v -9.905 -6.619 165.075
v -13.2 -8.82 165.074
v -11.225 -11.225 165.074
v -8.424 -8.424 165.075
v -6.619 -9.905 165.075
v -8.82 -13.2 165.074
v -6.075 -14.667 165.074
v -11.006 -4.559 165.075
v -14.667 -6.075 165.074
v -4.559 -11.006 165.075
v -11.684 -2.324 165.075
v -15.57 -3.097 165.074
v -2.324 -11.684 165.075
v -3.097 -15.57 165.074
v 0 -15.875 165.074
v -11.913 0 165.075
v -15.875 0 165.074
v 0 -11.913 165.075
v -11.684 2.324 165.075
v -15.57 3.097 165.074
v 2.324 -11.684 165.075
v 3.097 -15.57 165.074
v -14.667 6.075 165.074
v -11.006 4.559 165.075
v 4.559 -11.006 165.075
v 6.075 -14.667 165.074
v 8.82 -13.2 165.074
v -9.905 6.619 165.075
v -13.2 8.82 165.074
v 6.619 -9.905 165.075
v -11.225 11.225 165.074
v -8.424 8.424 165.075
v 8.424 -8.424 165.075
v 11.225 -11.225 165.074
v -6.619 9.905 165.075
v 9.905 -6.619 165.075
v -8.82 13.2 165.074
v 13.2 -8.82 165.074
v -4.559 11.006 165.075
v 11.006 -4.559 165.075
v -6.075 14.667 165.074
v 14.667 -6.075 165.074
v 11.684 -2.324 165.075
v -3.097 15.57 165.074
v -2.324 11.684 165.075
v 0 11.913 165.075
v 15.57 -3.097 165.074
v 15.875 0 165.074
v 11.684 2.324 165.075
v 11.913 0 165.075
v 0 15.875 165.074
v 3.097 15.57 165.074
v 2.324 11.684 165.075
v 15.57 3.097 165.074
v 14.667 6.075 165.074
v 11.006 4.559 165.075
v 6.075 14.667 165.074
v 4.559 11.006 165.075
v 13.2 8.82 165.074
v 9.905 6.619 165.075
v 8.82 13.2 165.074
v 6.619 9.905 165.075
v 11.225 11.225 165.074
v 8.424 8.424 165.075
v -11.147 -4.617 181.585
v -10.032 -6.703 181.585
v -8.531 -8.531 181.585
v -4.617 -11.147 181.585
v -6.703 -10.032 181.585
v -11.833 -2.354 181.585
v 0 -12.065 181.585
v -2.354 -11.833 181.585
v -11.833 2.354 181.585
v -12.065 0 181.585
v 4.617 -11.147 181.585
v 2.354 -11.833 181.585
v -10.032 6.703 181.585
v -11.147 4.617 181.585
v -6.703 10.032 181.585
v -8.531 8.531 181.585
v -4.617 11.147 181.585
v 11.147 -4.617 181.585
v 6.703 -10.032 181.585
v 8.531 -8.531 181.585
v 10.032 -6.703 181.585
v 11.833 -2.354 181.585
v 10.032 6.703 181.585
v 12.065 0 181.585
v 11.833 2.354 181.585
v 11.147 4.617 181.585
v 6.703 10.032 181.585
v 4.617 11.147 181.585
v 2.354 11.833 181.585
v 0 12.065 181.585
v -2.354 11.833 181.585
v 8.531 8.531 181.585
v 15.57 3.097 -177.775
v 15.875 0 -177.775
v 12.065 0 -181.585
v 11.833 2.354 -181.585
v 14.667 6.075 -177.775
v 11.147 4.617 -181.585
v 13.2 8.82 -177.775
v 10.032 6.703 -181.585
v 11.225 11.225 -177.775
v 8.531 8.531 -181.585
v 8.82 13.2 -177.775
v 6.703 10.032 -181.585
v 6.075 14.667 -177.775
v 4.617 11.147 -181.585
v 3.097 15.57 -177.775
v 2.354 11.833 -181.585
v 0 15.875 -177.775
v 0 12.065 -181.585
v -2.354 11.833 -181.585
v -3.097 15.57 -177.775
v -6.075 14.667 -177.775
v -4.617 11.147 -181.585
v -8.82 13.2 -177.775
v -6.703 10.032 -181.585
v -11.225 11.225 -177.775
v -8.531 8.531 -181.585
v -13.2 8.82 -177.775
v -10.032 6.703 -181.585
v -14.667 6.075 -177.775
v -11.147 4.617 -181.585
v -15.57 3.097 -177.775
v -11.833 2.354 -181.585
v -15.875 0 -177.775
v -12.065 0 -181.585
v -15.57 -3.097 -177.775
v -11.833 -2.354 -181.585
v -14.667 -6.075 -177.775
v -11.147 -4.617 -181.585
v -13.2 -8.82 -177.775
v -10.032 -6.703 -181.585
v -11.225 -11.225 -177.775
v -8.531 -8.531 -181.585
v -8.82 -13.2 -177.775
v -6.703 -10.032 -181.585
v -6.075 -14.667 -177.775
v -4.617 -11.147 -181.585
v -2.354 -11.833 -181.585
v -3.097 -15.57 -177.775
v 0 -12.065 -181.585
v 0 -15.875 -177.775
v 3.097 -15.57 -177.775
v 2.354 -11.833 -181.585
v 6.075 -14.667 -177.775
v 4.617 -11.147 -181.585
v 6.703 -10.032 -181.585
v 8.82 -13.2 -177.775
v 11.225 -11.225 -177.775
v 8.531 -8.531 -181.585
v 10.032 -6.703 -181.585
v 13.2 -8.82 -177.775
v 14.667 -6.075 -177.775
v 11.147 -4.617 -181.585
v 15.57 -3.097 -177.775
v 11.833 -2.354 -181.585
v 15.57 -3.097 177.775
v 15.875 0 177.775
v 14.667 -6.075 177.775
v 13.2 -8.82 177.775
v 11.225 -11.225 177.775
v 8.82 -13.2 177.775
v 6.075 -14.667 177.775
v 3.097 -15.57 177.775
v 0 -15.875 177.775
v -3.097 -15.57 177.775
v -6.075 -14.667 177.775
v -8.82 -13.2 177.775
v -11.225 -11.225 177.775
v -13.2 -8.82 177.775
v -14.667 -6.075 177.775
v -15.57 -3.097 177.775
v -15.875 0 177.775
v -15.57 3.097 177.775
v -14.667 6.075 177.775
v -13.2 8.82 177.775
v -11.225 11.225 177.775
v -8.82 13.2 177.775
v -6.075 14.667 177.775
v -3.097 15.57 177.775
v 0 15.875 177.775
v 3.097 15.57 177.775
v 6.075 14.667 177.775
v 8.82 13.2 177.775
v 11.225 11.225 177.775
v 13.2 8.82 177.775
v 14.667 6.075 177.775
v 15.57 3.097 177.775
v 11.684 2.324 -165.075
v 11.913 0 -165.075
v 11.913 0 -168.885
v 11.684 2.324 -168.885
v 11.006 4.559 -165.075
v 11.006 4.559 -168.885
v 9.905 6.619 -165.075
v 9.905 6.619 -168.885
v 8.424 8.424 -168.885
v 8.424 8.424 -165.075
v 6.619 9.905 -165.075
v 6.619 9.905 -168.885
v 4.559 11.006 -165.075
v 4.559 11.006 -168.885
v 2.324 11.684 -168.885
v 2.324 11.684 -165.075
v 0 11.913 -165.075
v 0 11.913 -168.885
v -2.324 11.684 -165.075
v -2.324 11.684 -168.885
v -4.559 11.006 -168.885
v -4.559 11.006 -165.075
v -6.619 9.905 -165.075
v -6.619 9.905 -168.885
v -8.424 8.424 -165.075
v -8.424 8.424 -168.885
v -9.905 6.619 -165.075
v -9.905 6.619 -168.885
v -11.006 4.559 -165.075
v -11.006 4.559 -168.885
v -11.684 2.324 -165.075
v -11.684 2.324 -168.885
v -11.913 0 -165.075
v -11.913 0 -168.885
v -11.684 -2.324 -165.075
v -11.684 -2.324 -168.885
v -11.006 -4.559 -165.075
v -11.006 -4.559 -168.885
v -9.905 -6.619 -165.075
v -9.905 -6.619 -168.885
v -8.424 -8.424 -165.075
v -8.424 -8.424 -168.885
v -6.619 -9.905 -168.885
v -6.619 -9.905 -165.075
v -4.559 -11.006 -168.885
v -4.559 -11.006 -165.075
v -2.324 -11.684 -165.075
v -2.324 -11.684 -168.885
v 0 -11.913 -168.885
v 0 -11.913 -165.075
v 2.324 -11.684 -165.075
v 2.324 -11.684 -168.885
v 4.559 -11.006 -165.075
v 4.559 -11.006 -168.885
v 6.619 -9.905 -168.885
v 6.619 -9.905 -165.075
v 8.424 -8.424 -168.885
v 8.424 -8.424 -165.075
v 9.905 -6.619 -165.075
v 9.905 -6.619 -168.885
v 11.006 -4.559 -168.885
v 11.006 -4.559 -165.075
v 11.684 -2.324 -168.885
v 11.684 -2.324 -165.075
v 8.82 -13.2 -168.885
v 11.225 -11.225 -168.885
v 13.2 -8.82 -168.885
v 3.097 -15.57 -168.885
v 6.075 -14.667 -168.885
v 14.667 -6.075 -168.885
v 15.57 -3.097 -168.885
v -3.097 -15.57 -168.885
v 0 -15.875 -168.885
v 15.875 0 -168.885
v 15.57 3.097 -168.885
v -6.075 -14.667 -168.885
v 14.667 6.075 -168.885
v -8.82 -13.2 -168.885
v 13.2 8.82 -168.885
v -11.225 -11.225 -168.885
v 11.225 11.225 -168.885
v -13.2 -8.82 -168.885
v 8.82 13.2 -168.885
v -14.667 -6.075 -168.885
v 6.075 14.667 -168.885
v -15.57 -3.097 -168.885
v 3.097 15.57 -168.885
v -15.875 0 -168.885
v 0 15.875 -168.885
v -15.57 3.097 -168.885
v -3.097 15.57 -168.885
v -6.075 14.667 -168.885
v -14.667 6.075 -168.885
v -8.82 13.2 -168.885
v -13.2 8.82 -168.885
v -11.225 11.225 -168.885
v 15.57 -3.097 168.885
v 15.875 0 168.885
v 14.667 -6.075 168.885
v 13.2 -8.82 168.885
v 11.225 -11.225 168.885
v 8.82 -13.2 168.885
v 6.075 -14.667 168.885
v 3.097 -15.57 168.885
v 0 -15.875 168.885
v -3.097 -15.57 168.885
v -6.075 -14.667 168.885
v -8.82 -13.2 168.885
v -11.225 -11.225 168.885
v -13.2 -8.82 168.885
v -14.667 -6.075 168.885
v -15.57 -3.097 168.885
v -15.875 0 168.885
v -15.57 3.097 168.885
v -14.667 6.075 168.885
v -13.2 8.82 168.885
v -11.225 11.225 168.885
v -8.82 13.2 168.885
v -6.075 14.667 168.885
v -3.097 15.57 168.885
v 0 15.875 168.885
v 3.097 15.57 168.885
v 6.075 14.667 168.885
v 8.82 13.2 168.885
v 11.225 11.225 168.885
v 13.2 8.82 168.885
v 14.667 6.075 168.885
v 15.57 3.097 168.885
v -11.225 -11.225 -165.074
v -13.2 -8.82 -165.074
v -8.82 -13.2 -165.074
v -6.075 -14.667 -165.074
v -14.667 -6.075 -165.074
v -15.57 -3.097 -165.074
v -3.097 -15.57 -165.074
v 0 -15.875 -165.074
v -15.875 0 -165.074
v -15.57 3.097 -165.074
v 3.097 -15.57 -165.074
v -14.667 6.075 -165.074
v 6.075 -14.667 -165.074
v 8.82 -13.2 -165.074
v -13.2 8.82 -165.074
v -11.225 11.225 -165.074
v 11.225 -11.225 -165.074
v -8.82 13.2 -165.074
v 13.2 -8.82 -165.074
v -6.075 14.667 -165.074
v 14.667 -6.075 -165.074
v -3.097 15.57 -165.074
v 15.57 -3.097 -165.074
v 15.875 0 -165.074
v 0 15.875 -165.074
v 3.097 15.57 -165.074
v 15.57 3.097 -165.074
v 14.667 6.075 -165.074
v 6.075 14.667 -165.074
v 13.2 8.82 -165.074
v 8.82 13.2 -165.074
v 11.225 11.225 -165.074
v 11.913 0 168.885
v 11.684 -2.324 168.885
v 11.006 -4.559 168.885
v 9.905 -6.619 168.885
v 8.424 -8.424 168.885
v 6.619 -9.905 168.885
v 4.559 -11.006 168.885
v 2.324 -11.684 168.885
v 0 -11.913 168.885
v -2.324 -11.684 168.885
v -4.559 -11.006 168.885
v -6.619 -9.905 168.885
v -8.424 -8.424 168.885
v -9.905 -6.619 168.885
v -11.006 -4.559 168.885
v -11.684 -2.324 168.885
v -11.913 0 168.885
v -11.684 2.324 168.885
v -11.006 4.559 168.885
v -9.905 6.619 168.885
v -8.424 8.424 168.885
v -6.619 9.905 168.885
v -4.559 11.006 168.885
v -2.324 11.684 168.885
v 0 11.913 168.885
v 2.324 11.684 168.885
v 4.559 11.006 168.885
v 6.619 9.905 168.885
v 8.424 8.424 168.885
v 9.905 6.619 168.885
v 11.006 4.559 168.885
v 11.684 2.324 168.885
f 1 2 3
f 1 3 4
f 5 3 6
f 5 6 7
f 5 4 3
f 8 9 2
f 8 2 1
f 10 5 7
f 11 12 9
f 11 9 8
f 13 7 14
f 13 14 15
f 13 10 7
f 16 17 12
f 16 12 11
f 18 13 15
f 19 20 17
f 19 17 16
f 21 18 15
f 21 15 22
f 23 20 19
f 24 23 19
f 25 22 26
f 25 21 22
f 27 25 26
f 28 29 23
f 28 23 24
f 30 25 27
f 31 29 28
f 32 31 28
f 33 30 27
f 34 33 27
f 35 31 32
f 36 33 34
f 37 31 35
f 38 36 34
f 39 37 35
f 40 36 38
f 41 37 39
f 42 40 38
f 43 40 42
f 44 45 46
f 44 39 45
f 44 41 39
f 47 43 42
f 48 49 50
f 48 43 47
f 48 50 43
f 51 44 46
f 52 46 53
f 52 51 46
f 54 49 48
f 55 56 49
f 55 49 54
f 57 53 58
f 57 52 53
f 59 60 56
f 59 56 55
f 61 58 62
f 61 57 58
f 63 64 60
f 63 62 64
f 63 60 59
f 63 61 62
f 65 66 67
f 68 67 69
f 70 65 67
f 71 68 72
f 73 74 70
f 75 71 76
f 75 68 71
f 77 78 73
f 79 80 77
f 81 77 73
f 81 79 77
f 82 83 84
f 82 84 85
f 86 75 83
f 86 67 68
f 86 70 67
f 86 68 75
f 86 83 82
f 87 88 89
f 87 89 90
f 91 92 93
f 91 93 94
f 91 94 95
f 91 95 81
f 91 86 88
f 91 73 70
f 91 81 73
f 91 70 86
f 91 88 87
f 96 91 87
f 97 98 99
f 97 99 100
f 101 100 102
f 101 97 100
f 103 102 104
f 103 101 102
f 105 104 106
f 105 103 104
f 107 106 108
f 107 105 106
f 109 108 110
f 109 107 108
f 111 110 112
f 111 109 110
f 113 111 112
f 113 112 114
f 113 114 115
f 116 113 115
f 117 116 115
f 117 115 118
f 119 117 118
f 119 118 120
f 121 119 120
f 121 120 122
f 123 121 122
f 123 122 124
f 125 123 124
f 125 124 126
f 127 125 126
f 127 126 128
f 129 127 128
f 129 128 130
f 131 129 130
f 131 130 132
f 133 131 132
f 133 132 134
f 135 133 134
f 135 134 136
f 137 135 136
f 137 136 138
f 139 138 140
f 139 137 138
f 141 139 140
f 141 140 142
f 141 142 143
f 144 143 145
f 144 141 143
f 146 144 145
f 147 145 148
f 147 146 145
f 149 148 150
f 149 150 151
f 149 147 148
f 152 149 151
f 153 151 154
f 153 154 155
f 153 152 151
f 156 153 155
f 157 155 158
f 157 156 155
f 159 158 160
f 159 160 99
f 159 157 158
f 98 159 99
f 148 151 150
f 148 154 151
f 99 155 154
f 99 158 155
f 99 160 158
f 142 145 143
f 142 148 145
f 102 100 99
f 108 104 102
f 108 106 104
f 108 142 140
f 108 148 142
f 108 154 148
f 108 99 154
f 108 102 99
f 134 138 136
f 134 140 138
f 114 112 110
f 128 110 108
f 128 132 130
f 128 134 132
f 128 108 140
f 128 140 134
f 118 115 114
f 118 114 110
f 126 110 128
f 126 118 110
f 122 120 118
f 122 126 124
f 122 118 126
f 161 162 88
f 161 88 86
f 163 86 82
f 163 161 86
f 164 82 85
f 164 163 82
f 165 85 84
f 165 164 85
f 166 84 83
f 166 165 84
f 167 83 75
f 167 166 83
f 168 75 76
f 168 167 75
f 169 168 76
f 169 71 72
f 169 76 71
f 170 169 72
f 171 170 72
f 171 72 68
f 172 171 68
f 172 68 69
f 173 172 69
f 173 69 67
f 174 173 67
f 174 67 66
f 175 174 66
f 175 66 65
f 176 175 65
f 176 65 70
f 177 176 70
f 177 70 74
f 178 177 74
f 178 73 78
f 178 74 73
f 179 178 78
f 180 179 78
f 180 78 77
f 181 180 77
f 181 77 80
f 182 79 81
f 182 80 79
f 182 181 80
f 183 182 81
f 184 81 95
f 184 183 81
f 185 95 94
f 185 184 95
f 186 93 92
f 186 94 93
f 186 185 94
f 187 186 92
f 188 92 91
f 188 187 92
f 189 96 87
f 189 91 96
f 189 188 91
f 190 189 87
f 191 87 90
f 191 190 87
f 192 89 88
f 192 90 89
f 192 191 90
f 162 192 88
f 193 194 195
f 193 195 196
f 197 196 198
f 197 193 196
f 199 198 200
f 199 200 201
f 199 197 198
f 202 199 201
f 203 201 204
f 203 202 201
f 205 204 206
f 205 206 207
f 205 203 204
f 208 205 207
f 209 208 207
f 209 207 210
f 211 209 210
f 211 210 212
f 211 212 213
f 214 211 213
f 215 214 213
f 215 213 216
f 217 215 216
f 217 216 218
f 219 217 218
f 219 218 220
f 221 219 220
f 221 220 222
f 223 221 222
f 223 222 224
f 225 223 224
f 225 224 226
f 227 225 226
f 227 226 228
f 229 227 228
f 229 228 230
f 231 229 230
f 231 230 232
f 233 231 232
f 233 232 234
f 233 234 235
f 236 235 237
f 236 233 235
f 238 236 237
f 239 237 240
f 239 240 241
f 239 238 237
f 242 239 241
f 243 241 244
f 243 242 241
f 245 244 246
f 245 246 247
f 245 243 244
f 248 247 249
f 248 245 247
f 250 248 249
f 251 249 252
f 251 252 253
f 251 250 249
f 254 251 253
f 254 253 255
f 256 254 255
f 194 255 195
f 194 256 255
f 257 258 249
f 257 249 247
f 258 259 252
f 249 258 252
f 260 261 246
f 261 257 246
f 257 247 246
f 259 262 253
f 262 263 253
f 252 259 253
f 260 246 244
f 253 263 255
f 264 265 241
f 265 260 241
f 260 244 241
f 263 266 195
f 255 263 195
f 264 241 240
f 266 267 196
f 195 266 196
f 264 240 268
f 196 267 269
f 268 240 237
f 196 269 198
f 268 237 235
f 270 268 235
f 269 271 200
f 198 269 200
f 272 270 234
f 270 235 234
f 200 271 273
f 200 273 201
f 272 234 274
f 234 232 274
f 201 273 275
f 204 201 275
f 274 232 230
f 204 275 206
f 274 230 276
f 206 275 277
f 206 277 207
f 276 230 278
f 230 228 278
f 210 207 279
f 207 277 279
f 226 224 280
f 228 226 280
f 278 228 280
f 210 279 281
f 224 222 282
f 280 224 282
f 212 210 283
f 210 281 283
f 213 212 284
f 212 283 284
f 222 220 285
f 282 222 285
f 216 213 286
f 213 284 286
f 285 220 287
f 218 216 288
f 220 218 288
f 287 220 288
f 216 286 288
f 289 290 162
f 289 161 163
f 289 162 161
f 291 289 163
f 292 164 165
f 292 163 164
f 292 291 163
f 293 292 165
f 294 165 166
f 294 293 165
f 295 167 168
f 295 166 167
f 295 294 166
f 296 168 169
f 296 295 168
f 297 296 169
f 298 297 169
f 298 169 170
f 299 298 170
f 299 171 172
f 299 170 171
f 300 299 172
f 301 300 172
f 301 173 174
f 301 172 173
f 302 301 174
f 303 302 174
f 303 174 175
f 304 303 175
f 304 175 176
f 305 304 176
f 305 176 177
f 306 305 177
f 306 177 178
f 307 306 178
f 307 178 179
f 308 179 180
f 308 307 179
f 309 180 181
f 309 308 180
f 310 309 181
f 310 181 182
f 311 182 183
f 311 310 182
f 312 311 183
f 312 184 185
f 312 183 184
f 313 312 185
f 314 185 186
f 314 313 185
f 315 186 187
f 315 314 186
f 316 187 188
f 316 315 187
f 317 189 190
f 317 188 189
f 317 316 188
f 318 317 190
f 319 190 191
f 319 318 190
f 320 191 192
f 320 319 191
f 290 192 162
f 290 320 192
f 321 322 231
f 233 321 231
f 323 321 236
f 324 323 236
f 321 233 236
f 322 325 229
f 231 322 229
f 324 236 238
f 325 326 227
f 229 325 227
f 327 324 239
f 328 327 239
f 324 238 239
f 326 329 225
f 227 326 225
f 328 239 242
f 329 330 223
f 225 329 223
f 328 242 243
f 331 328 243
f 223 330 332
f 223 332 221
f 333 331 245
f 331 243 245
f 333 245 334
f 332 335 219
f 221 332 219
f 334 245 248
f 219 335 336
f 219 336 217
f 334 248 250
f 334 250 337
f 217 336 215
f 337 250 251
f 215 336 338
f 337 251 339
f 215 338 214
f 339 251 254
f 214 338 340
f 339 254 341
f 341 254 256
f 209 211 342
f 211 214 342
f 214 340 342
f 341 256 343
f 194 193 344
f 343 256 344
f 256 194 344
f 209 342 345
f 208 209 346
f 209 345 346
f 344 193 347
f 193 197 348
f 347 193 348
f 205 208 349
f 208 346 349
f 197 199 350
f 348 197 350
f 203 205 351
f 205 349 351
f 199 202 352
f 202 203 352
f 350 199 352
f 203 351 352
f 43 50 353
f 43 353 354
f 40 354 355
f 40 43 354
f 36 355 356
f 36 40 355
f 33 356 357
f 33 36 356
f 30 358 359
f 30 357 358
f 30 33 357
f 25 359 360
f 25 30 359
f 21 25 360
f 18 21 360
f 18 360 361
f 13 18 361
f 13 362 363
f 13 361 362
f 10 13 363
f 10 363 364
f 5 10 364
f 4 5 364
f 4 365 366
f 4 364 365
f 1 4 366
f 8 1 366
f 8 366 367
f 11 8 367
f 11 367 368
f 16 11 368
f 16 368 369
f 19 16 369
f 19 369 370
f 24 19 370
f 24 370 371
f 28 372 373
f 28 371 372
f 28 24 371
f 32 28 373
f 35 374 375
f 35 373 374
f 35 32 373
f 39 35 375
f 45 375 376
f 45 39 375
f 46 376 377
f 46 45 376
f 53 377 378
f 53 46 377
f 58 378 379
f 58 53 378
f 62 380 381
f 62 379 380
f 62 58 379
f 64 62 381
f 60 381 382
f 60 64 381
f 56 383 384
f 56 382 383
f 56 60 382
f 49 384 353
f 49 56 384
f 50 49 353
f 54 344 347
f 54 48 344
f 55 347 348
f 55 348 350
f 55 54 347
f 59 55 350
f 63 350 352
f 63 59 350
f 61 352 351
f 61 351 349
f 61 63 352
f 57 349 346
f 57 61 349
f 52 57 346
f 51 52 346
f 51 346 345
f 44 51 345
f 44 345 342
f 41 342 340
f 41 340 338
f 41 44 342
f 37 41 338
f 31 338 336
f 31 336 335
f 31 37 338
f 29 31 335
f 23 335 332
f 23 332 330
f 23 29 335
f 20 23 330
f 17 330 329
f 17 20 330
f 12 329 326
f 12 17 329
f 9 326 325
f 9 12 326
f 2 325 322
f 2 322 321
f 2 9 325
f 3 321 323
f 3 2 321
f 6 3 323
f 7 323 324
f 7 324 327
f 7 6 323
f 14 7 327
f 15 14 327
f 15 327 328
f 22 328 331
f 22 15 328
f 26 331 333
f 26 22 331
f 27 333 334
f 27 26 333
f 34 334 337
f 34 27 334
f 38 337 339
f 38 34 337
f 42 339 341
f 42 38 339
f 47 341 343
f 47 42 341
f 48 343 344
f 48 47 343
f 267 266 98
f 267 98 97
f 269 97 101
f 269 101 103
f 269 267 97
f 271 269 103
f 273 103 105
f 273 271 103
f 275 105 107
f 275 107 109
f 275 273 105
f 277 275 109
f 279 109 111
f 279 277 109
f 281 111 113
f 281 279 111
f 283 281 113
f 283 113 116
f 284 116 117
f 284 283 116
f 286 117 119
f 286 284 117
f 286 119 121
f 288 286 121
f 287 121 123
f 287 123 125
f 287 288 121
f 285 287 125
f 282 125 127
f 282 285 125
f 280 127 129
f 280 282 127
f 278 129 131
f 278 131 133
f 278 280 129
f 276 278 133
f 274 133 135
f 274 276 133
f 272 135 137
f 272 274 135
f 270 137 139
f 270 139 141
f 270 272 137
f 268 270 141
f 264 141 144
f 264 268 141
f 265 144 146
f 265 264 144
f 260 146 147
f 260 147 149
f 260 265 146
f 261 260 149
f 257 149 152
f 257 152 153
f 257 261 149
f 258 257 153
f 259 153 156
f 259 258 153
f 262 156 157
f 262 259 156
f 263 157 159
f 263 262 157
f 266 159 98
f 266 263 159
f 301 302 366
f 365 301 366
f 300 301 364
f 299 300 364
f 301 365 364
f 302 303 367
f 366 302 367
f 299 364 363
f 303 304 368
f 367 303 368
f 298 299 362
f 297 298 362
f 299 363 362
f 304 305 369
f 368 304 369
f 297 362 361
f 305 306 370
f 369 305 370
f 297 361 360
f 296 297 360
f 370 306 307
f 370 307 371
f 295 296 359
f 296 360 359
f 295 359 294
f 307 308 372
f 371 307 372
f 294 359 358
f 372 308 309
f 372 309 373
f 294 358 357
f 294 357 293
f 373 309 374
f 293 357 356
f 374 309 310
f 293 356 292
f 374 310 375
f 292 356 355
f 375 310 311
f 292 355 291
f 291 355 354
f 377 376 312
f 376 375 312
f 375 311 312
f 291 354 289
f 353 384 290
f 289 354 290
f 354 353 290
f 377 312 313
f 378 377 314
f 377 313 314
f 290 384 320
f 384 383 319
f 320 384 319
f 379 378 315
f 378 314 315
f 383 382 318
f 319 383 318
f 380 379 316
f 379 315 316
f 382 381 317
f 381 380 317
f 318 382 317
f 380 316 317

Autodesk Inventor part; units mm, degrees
ref_plane "YZ Plane" through (0, 0, 0) normal (1, 0, 0) x (0, 1, 0)
ref_plane "XZ Plane" through (0, 0, 0) normal (0, 1, 0) x (-1, 0, 0)
ref_plane "XY Plane" through (0, 0, 0) normal (0, 0, 1) x (1, 0, 0)
sketch "Sketch1" plane through (0, 0, 0) normal (0, 0, 1) x (1, 0, 0)
  circle A0 centre (0, 0) radius 1.5875
  dimension "d0" = 3.175
extrude "Extrusion1" add sketch "Sketch1" along normal mid plane 33.0149
sketch "Sketch2" plane through (0, 0, 16.5075) normal (0, 0, 1) x (1, 0, 0)
  circle A0 centre (0, 0) radius 1.1913
  dimension "d3" = 2.3825
extrude "Extrusion2" add sketch "Sketch2" along normal blind 0.381
sketch "Sketch3" plane through (0, 0, 16.8885) normal (0, 0, 1) x (1, 0, 0)
  circle A0 centre (0, 0) radius 1.5875
  dimension "d6" = 3.175
extrude "Extrusion3" add sketch "Sketch3" along normal blind 1.27
chamfer "Chamfer1" distance 0.381 angle 45 1 edges at (-1.5875, 0, 18.1585)
mirror "Mirror1" about plane through (0, 0, 0) normal (0, 0, 1) of "Extrusion3", "Extrusion2", "Chamfer1"
scale "Scale1" factors (10, 10, 10) then translate (0, 0, 0) bodies 1
properties part number "Front Upper Hinge Pin"
